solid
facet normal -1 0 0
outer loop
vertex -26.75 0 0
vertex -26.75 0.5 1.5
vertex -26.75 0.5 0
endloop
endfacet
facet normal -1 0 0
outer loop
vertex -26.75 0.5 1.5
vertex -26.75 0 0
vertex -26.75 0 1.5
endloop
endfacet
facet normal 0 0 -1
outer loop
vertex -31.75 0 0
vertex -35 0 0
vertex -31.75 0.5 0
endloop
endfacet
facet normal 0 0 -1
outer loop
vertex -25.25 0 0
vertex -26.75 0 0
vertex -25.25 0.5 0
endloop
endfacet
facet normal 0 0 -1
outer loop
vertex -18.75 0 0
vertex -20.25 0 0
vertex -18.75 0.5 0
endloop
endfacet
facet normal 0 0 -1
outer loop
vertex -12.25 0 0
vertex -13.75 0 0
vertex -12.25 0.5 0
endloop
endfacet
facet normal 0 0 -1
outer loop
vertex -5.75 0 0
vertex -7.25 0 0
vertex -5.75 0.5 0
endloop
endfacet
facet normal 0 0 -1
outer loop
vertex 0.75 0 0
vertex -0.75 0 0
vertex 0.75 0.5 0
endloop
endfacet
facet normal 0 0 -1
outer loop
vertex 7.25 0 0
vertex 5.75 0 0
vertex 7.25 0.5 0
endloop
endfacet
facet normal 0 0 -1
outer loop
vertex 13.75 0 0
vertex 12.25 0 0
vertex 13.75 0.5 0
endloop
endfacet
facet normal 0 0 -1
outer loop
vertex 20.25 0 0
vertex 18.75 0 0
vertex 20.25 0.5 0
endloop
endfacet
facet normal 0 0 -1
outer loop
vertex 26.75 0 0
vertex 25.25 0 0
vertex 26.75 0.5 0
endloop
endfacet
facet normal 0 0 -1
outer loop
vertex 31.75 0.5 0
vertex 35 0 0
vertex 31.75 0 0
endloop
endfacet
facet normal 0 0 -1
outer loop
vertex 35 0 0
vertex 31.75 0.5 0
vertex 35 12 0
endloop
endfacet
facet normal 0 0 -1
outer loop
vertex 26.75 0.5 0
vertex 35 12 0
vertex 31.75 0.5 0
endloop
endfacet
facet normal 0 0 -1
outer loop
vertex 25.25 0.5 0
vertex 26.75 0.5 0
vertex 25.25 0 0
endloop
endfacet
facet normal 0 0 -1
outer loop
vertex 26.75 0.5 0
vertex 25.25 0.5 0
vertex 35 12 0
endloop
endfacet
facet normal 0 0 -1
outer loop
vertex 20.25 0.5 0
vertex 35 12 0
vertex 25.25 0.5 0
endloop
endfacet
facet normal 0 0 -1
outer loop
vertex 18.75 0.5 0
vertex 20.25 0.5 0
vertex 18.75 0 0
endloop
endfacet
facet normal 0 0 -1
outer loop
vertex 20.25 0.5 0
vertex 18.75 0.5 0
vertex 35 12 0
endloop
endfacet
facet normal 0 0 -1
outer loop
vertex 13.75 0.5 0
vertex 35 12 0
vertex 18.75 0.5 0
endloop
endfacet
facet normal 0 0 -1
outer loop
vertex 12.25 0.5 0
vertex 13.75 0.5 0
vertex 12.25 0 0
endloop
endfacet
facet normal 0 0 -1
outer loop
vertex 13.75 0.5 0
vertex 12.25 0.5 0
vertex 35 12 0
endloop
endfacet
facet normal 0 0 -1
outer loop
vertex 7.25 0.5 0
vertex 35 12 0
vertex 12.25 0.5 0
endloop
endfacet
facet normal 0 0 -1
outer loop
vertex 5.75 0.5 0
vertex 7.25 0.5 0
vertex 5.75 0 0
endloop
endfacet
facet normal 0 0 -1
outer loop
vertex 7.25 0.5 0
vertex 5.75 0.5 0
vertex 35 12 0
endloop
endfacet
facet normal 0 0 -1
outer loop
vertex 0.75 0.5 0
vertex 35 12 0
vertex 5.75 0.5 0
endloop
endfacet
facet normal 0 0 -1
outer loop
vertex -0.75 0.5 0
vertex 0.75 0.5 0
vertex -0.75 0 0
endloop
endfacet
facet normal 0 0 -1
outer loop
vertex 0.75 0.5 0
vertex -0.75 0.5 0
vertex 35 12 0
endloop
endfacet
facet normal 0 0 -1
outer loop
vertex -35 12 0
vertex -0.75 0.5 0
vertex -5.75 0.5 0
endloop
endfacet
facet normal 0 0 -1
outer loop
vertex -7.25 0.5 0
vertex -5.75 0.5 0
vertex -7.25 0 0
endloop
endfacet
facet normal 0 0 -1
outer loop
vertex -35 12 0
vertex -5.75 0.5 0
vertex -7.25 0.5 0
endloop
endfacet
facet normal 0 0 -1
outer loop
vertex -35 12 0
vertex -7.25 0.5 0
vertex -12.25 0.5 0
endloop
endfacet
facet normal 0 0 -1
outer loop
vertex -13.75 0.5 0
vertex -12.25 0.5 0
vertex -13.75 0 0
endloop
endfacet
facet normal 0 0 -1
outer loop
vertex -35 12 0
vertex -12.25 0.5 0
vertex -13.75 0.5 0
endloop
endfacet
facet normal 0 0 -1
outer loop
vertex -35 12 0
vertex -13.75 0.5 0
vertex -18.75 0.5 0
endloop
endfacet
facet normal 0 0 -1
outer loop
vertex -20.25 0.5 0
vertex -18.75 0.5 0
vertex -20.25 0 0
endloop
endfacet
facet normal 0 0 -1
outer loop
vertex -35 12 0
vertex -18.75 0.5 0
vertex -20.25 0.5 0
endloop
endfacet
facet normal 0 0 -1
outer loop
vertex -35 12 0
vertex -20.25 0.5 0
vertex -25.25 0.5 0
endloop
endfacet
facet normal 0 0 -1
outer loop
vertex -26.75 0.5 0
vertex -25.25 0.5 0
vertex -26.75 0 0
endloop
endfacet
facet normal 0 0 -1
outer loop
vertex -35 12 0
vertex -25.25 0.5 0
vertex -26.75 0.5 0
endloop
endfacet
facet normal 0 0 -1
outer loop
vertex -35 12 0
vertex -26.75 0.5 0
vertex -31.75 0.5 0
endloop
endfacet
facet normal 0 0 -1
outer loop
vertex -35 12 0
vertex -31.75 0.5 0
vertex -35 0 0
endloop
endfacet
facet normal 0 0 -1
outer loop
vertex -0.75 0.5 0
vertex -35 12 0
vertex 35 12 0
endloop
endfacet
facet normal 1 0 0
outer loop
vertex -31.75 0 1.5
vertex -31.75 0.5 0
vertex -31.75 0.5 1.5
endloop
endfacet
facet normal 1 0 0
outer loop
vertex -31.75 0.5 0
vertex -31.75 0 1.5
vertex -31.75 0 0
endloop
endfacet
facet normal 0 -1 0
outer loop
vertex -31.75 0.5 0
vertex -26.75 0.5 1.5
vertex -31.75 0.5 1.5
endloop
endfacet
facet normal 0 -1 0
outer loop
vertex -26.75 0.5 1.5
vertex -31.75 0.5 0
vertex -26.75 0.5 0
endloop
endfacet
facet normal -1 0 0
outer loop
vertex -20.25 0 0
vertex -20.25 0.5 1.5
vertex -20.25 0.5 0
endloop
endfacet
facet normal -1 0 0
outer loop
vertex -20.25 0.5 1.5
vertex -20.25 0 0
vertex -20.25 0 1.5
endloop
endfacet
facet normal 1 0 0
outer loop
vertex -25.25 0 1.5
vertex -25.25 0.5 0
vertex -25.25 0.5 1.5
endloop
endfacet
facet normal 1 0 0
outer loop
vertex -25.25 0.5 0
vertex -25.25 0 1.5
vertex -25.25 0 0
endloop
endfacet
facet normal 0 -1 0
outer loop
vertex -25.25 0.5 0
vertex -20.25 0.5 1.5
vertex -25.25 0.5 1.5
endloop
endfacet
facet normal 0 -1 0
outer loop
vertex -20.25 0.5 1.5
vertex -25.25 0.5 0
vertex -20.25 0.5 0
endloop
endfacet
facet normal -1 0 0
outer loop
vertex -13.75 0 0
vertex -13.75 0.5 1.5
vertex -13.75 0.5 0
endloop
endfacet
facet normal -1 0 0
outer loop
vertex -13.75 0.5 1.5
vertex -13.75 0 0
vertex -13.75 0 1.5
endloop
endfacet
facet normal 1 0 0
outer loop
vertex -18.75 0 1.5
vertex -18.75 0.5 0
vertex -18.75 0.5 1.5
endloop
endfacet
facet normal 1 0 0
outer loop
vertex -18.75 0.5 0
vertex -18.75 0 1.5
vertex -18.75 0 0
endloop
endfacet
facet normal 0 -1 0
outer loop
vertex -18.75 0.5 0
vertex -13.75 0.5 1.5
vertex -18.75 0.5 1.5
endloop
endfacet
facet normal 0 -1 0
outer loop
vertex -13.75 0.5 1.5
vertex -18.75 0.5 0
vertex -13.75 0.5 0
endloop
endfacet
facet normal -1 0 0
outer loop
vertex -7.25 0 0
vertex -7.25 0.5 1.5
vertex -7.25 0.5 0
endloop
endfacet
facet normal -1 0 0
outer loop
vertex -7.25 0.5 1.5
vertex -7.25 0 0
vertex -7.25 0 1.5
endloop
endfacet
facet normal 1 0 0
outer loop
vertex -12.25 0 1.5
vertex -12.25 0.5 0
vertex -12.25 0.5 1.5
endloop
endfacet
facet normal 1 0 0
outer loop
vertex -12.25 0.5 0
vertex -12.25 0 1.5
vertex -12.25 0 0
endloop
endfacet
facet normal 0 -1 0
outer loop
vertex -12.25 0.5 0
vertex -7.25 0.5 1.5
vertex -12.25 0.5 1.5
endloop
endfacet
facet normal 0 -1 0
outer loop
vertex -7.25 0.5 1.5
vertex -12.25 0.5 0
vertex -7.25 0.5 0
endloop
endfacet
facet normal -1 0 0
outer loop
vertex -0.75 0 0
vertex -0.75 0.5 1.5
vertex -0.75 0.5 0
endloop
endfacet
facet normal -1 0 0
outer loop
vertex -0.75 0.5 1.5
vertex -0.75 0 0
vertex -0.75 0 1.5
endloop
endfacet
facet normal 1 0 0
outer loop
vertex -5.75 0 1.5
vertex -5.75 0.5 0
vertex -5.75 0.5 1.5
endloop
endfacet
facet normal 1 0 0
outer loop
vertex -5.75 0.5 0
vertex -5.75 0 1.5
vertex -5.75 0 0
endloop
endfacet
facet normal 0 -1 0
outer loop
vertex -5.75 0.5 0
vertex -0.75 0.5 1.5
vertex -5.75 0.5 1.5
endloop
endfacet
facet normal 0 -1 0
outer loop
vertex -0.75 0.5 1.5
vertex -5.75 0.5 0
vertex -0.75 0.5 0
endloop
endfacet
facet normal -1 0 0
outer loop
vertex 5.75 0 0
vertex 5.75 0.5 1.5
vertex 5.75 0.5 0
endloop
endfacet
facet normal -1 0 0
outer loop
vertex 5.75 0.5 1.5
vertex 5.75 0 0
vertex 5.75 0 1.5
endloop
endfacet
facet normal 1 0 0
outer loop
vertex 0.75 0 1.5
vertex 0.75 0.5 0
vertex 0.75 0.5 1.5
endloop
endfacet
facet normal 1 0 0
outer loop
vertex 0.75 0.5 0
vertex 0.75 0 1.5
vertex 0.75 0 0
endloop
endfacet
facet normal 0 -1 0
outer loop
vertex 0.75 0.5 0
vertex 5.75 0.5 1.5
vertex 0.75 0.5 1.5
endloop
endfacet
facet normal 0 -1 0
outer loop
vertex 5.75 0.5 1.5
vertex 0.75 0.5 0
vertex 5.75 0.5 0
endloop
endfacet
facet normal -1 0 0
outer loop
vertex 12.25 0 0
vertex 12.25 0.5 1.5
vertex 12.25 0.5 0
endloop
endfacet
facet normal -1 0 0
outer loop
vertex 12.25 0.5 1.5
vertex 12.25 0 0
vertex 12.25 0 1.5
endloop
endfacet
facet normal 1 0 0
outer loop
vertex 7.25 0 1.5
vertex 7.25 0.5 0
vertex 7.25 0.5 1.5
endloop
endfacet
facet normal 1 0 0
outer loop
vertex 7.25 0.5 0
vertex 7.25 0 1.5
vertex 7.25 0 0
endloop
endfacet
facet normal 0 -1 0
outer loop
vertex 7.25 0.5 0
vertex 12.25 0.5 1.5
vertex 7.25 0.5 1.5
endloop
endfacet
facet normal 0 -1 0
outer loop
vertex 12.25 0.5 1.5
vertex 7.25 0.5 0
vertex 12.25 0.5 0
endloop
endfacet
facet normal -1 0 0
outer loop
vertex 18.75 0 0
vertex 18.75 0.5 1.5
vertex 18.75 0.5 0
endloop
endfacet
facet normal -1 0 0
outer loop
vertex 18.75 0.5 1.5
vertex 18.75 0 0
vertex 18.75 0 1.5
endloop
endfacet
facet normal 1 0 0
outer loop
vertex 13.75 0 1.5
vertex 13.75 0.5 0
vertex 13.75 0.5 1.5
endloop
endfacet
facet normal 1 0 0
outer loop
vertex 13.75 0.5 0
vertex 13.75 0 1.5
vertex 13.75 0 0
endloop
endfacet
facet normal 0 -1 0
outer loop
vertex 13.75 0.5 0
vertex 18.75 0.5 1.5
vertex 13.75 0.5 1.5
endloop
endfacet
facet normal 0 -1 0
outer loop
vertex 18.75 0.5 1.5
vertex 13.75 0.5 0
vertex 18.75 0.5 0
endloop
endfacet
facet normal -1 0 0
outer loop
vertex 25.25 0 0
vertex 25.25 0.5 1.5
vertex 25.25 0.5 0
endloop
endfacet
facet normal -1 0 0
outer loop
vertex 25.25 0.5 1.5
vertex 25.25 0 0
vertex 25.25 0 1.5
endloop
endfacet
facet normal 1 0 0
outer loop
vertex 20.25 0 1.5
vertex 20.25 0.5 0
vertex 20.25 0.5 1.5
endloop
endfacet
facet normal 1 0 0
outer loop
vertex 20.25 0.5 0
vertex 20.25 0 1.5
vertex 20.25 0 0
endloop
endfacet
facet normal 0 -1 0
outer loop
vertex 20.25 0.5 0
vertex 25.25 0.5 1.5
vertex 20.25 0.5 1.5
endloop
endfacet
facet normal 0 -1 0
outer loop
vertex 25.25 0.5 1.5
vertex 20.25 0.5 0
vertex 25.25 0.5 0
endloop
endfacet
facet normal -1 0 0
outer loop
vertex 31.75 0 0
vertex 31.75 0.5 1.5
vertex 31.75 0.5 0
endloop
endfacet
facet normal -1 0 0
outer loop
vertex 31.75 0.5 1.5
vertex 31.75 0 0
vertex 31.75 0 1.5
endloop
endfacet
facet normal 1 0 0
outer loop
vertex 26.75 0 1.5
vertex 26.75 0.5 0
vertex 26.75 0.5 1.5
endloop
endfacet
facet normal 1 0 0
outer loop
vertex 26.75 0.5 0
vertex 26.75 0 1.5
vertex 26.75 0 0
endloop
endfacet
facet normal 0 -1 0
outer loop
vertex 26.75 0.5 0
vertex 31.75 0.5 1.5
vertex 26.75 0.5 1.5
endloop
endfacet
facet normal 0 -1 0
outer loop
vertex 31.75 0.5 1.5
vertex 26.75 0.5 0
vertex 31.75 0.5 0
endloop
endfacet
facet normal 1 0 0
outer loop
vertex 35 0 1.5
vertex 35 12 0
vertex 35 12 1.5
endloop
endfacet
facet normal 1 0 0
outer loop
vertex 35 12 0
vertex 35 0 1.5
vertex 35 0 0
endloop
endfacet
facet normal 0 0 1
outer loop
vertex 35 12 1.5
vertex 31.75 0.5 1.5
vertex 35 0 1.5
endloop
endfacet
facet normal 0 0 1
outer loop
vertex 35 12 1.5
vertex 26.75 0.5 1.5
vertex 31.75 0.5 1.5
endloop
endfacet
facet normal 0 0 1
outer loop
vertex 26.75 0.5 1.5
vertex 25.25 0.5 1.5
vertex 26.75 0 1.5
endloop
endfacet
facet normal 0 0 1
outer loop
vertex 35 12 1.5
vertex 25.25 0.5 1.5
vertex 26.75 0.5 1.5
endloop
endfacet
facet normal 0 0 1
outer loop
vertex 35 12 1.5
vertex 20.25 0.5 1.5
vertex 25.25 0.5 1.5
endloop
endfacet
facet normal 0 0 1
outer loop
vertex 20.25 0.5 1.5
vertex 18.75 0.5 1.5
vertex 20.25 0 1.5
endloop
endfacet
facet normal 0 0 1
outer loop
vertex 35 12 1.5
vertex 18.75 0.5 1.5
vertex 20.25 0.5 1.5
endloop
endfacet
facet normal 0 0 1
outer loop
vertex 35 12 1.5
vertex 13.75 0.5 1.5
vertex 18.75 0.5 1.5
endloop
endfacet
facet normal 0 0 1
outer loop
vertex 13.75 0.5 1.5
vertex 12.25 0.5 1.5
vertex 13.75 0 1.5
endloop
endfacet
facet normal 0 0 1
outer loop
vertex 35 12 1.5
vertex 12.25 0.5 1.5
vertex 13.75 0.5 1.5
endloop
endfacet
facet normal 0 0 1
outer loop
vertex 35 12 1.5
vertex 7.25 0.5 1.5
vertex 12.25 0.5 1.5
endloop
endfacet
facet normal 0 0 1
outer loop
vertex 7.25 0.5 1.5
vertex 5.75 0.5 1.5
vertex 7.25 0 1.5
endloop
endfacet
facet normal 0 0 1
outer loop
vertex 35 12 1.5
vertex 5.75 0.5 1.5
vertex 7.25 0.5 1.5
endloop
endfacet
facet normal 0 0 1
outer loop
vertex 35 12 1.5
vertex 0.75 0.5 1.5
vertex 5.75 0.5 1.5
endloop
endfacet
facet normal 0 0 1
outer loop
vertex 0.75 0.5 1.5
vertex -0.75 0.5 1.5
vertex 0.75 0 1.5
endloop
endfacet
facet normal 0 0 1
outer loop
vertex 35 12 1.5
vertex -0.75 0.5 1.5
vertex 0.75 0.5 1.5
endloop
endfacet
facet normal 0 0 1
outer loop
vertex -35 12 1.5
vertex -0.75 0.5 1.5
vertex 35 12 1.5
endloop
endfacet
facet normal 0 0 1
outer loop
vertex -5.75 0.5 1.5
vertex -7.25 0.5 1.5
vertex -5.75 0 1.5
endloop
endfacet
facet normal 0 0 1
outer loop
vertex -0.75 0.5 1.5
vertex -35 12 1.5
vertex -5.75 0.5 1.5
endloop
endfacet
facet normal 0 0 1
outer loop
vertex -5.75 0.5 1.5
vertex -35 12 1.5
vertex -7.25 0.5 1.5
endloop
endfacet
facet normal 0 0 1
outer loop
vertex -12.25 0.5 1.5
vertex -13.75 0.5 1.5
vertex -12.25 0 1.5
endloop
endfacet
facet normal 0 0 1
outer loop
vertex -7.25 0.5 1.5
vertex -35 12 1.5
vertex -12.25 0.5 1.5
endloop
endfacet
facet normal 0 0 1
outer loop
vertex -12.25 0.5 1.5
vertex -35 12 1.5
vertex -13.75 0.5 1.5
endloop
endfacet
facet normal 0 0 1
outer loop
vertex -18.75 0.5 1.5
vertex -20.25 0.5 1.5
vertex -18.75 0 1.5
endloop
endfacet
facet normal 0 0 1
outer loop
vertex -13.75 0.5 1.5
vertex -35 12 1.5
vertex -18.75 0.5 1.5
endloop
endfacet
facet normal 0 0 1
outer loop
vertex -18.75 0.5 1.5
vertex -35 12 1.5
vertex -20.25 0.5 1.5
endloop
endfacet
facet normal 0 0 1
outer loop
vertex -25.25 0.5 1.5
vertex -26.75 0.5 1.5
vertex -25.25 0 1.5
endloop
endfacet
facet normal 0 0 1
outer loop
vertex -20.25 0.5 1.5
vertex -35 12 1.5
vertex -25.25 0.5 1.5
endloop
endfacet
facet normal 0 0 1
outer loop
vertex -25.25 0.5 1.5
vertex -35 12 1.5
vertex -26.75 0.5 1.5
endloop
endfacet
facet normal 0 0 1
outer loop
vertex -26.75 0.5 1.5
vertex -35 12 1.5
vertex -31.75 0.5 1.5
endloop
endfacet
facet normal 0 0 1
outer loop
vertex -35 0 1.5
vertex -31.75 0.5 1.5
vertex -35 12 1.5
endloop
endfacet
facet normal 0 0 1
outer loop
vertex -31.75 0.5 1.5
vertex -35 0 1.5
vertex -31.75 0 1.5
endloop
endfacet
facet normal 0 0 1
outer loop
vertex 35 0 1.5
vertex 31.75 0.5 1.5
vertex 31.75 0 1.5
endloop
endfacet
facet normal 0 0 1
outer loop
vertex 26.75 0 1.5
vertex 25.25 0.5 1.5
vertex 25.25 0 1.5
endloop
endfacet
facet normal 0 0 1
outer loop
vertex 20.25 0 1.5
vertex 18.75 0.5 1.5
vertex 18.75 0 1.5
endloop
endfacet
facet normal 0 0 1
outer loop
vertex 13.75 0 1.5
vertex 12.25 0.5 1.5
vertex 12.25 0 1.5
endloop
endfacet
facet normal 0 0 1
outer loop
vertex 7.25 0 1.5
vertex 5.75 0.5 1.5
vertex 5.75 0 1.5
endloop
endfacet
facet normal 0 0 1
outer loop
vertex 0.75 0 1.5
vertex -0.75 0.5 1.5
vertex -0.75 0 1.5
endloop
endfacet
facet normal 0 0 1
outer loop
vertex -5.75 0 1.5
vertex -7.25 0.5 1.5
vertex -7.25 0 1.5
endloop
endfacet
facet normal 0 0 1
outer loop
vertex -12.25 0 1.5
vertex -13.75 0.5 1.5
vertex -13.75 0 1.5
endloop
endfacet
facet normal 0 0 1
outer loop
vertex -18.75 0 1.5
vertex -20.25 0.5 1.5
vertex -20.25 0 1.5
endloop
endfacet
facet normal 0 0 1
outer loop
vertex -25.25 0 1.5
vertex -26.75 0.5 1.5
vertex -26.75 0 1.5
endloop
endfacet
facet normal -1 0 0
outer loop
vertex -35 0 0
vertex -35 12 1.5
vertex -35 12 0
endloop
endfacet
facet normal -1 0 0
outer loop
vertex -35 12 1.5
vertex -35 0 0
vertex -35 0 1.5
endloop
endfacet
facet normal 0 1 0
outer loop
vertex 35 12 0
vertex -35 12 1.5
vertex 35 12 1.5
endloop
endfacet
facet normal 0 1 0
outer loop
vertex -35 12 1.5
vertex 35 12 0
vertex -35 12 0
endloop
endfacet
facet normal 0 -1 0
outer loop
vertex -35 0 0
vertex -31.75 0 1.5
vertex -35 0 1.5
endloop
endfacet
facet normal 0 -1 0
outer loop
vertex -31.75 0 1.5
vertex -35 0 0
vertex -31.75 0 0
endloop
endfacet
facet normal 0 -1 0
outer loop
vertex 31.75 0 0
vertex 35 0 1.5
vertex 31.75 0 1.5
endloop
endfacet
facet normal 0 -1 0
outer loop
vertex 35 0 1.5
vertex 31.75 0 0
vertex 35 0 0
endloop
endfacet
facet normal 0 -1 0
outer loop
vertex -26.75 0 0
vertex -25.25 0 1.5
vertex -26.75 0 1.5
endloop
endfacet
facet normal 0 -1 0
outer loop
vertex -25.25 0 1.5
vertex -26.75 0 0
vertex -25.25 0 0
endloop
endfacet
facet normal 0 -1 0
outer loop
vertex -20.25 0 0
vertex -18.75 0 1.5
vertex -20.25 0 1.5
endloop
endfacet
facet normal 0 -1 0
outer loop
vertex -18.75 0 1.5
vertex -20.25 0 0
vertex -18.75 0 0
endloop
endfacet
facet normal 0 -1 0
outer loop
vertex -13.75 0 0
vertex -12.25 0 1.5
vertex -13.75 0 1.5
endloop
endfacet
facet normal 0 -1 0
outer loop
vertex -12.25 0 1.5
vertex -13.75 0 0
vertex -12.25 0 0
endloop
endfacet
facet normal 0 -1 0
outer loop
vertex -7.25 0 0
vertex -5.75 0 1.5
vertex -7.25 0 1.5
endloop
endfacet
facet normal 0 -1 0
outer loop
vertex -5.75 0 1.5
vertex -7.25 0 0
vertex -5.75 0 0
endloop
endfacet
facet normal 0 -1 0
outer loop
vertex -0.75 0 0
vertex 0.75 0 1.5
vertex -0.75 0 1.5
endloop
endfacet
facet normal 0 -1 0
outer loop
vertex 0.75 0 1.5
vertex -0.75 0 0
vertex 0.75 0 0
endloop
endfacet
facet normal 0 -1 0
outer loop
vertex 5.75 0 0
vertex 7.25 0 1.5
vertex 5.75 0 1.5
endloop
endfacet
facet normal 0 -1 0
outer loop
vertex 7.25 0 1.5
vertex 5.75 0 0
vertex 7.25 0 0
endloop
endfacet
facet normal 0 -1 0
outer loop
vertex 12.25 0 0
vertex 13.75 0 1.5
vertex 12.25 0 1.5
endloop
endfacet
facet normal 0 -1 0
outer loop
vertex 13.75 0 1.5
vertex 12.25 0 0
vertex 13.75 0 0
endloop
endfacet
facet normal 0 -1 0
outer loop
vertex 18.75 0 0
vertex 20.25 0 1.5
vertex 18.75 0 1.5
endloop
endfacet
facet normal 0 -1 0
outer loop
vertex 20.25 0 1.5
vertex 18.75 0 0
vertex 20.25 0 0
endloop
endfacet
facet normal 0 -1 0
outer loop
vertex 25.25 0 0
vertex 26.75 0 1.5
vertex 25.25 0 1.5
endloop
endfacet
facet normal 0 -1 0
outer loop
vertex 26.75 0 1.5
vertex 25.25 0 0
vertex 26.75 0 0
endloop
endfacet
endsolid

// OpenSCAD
// 10-well agarose gel comb, printed lying flat
// Units: mm

plate_t      = 1.5;   // plate thickness (Z)
spine_l      = 70;    // spine length (X)
spine_w      = 12;    // spine width (Y)
teeth_n      = 10;    // number of teeth
teeth_w      = 5;     // tooth width (X)
teeth_l      = 12;    // tooth length (Y)
teeth_gap    = 1.5;   // gap between teeth (X)
overcut      = 0.5;   // cutter overshoot past faces

$fn = 64;

pitch = teeth_w + teeth_gap;
x0    = -(teeth_n - 1) * pitch / 2;   // first tooth centre X

difference() {
    // Spine
    translate([-spine_l / 2, 0, 0])
        cube([spine_l, spine_w, plate_t]);

    // Teeth
    for (i = [0 : teeth_n - 1])
        translate([x0 + i * pitch - teeth_w / 2, -teeth_l, 0])
            cube([teeth_w, teeth_l + overcut, plate_t + overcut]);
}
